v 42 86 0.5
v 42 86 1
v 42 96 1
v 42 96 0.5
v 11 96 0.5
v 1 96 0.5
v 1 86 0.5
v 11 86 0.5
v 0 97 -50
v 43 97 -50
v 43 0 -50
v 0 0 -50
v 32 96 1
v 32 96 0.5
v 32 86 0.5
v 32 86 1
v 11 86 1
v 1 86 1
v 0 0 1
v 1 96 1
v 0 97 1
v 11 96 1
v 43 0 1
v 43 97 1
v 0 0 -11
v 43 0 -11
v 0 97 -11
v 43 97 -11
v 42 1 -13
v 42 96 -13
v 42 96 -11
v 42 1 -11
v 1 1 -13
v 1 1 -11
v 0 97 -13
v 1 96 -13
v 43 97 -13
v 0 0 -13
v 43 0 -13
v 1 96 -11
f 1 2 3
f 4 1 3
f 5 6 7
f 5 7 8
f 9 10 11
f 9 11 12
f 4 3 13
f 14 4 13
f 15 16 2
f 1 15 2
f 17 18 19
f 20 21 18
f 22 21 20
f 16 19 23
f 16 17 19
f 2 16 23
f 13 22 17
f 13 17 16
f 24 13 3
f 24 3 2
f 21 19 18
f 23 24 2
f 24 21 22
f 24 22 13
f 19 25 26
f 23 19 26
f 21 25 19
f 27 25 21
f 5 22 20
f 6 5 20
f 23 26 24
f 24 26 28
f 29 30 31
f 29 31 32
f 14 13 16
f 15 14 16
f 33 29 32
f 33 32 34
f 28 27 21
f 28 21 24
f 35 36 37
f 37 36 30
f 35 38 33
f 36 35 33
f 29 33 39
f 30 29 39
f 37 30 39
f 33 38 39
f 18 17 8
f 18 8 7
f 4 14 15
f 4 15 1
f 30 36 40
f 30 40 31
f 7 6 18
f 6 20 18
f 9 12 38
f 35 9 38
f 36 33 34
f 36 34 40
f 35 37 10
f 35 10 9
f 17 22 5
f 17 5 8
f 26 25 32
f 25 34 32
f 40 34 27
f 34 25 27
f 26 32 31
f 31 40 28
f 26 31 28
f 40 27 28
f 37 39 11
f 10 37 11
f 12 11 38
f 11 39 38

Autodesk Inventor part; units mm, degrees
ref_plane "YZ Plane" through (0, 0, 0) normal (1, 0, 0) x (0, 1, 0)
ref_plane "XZ Plane" through (0, 0, 0) normal (0, 1, 0) x (-1, 0, 0)
ref_plane "XY Plane" through (0, 0, 0) normal (0, 0, 1) x (1, 0, 0)
sketch "Sketch1" plane through (0, 0, 0) normal (0, 1, 0) x (-1, 0, 0)
  line L0 (0, 0) -> (-40, 0)
  line L1 (-40, 0) -> (-40, -50)
  line L2 (-40, -50) -> (0, -50)
  line L3 (0, -50) -> (0, 0)
  dimension "d0" = 40
  dimension "d1" = 50
extrude "Extrusion1" add sketch "Sketch1" along normal blind 100
move faces "Move1" translate (0, 0, -13) faces at (13.3333, 33.3333, 0)
sketch "Sketch2" plane through (0, 0, -13) normal (0, 0, 1) x (1, 0, 0)
  line L0 (0, 0) -> (40, 0) projected
  line L1 (40, 0) -> (40, 100) projected
  line L2 (0, 100) -> (40, 100) projected
  line L3 (0, 0) -> (0, 100) projected
  line L4 (39, 99) -> (39, 1)
  line L5 (39, 1) -> (1, 1)
  line L6 (1, 1) -> (1, 99)
  line L7 (1, 99) -> (39, 99)
  dimension "d7" = 1
extrude "Extrusion2" add sketch "Sketch2" along normal blind 2 contours L4 L5 L6 L7
sketch "Sketch3" plane through (0, 0, -11) normal (0, 0, 1) x (1, 0, 0)
  line L0 (0, 100) -> (40, 100) projected
  line L1 (0, 0) -> (0, 100) projected
  line L2 (40, 0) -> (40, 100) projected
  line L3 (0, 0) -> (40, 0) projected
extrude "Extrusion3" add sketch "Sketch3" along normal blind 12
move faces "Move2" translate (3, 0, 0) faces at (40, 66.6667, -37.6667) (39, 33.6667, -12.3333) (40, 33.3333, -7)
move faces "Move3" translate (0, -3, 0) faces at (28.6667, 100, -25.3333) (14.6667, 99, -11.6667) (14.3333, 100, -3)
sketch "Sketch4" plane through (0, 0, 1) normal (0, 0, 1) x (1, 0, 0)
  line L0 (0, 97) -> (0, 0) projected
  line L1 (0, 0) -> (43, 0) projected
  line L2 (43, 0) -> (43, 97) projected
  line L3 (43, 97) -> (0, 97) projected
  line L4 (1, 96) -> (1, 1)
  line L5 (1, 1) -> (42, 1)
  line L6 (42, 1) -> (42, 96)
  line L7 (42, 96) -> (1, 96)
  line L8 (1, 96) -> (42, 96) projected
  line L9 (1, 96) -> (11, 96)
  line L10 (11, 96) -> (11, 86)
  line L11 (11, 86) -> (1, 86)
  line L12 (1, 86) -> (1, 96)
  line L13 (42, 96) -> (32, 96)
  line L14 (32, 96) -> (32, 86)
  line L15 (32, 86) -> (42, 86)
  line L16 (42, 86) -> (42, 96)
  dimension "d18" = 1
  dimension "d19" = 10
  dimension "d20" = 10
  dimension "d21" = 10
  dimension "d22" = 10
extrude "Extrusion4" cut sketch "Sketch4" against normal blind 0.5 contours L7 L10 L11 L4 | L7 L6 L15 L14
ref_plane "Work Plane1" through (0, 48.5, 0) normal (0, -1, 0) x (1, 0, 0)
equation "\"d22\" = d20"
properties part number "1.4AH SLAB"
